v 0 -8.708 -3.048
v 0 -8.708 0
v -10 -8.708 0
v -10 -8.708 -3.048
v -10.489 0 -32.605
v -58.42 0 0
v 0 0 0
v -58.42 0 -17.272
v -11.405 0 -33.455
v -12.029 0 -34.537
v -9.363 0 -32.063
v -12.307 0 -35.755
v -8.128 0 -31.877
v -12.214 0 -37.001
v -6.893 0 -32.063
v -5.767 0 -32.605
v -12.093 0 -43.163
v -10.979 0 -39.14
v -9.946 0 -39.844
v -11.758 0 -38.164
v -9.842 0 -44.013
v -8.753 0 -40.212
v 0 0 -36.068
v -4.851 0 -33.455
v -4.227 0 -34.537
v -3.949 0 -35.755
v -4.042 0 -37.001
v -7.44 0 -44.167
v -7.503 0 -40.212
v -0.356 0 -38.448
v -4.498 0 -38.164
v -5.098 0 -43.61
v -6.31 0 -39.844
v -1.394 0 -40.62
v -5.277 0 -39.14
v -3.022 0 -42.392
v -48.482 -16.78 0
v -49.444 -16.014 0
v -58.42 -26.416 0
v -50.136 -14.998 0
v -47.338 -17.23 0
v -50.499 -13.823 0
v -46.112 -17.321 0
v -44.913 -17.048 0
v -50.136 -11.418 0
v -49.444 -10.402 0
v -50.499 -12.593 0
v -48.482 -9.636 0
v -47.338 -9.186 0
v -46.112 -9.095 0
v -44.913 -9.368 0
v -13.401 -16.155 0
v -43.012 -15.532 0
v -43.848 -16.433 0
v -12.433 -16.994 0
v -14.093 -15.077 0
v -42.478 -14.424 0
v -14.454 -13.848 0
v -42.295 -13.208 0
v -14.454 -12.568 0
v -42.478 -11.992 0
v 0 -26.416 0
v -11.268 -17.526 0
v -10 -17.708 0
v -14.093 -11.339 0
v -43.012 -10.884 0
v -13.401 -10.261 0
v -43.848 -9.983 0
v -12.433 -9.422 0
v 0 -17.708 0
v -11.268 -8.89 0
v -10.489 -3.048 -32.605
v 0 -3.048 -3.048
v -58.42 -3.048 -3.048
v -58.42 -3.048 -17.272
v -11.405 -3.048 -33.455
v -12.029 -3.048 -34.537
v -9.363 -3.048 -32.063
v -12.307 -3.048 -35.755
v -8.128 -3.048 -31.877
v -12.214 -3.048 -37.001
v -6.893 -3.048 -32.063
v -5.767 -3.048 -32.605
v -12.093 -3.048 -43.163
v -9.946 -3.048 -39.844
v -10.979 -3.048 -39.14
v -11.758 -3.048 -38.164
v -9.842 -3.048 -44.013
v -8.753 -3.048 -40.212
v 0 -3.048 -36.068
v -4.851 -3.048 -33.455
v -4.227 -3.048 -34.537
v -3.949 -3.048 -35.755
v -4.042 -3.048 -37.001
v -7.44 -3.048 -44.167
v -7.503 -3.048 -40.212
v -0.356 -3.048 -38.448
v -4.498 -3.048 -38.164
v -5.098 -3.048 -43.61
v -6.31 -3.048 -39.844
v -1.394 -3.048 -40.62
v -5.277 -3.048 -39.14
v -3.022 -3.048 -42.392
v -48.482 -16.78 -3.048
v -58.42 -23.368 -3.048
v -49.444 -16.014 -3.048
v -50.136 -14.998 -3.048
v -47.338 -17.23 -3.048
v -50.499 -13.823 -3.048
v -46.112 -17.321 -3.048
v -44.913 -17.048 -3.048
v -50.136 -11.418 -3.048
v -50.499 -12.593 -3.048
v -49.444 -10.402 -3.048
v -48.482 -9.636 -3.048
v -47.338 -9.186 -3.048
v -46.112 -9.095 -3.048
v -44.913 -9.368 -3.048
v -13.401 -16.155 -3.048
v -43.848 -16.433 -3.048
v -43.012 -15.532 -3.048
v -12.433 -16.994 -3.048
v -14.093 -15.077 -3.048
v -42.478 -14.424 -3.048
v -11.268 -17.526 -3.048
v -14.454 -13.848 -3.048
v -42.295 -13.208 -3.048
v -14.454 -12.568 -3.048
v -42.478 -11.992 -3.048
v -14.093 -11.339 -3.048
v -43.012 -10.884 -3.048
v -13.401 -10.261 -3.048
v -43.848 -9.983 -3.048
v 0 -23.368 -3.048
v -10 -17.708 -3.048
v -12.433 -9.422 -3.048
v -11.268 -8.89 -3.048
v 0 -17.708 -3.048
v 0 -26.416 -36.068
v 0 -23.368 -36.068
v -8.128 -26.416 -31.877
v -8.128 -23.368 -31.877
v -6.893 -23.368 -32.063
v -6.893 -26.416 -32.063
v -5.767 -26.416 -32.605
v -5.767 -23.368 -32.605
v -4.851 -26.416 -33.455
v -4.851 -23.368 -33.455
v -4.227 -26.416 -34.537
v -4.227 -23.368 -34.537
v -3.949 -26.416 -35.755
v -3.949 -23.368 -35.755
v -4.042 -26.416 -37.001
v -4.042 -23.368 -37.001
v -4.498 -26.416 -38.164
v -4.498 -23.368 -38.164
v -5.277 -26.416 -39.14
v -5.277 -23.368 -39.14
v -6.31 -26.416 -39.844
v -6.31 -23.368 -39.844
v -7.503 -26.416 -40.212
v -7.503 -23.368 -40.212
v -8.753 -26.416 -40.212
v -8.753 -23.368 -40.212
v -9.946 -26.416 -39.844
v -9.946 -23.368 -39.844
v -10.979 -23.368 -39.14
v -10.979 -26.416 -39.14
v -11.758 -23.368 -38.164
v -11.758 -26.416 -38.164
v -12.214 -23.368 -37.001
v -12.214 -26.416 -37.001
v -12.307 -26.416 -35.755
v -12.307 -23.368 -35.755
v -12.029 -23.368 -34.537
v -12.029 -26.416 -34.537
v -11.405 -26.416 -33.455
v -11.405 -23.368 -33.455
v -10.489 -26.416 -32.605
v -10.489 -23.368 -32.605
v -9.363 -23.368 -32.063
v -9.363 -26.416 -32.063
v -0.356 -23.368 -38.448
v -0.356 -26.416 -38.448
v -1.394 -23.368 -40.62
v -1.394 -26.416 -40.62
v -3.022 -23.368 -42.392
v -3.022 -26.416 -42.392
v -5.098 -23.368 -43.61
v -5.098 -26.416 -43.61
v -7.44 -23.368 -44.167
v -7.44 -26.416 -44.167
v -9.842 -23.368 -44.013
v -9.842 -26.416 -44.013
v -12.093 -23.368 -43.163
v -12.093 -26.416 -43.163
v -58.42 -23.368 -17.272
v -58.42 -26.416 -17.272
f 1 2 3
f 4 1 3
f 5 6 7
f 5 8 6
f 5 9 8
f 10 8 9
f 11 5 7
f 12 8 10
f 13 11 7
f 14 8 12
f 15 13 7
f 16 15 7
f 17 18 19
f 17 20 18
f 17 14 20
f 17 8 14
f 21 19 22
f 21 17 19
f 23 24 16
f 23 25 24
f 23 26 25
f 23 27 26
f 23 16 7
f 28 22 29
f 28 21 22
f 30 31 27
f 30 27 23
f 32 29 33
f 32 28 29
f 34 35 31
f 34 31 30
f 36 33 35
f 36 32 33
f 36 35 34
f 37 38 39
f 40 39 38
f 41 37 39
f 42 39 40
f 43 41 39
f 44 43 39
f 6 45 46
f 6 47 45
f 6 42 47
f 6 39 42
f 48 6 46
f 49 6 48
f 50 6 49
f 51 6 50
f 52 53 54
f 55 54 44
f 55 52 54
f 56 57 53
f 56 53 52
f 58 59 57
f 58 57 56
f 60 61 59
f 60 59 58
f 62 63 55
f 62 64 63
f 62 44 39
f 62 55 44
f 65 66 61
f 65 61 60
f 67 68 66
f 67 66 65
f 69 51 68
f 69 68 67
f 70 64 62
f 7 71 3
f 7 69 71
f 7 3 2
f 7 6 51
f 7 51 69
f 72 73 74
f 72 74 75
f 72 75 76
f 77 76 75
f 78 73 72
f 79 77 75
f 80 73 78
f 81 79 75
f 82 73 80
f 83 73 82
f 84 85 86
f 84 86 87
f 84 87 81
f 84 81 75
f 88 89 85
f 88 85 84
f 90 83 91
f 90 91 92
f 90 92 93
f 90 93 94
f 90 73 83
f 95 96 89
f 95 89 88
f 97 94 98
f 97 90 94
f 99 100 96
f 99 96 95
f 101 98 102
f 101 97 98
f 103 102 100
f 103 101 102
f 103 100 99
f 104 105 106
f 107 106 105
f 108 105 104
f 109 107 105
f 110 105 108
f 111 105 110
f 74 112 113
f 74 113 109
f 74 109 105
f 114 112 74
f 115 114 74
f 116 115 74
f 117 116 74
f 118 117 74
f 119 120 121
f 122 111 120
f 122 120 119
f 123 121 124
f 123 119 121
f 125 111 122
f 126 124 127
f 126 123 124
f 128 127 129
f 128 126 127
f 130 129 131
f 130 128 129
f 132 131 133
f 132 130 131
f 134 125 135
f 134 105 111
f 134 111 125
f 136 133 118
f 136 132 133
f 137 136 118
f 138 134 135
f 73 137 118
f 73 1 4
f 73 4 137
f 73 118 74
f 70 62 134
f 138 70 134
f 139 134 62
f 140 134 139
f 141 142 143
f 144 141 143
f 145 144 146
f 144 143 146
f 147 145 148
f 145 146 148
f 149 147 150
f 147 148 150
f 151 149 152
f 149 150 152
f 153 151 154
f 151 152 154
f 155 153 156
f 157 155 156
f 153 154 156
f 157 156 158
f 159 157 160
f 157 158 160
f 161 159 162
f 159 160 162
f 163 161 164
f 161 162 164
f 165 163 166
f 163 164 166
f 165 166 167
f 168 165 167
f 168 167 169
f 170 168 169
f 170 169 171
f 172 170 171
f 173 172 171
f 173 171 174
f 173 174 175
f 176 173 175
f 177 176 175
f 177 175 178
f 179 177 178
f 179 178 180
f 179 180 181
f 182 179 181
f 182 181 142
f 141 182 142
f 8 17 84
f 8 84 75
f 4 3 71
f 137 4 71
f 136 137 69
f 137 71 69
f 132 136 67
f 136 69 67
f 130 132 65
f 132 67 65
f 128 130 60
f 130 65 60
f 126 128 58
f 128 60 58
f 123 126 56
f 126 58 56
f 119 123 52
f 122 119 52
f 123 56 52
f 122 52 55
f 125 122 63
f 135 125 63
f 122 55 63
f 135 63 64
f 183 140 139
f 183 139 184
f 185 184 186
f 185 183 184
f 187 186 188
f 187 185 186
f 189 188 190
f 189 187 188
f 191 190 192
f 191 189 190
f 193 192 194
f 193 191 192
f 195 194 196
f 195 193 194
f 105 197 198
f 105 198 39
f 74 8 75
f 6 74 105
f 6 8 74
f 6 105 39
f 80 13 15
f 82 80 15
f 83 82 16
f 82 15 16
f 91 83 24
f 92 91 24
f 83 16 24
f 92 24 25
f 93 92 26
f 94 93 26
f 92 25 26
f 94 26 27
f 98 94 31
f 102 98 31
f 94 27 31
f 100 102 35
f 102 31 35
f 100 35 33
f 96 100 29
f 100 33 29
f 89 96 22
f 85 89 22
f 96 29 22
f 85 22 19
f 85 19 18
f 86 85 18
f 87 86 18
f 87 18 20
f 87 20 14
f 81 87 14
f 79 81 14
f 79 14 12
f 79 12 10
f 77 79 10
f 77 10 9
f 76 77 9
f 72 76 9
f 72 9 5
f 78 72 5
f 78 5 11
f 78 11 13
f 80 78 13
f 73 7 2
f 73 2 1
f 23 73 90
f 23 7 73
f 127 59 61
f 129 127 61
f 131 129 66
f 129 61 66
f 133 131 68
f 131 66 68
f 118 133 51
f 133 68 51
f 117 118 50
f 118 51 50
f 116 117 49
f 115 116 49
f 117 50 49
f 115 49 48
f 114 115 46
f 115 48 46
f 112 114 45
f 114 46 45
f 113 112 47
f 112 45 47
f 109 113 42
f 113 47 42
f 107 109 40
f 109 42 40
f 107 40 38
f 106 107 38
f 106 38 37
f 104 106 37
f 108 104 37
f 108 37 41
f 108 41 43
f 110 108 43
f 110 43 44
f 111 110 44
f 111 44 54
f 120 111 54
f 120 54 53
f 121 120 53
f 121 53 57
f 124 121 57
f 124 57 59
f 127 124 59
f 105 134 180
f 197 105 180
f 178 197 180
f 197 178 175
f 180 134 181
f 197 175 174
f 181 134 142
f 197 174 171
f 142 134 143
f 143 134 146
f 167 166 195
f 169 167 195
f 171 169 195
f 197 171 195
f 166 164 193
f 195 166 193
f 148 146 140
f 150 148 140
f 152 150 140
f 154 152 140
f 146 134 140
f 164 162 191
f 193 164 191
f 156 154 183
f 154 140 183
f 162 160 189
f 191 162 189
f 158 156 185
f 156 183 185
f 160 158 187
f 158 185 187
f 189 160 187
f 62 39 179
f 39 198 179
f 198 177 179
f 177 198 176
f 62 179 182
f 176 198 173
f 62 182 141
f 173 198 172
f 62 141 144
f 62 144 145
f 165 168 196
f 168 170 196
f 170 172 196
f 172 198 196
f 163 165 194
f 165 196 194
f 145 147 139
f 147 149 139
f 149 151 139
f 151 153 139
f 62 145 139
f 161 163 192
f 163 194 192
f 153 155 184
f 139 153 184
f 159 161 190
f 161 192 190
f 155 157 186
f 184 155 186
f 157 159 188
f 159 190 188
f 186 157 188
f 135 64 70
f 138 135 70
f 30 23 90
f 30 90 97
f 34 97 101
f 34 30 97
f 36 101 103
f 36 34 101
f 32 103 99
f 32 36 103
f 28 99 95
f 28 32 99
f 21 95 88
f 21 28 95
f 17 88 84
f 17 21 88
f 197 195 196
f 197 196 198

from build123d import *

# Parameters (mm, degrees)
SKETCH1_R           = 8.128
SKETCH1_R_2         = 4.191
BOSS_EXTRUDE1_DEPTH = 26.416
CUT_EXTRUDE1_REACH  = 60.42
SKETCH2_W           = 41.148
SKETCH2_H           = 20.32
CUT_EXTRUDE2_REACH  = 46.196
SKETCH3_R           = 4.125


with BuildPart() as part:
    # Sketch1 → Boss-Extrude1 (new body)
    with BuildSketch(Plane(origin=(0, 0, 0), x_dir=(1, 0, 0), z_dir=(0, 1, 0))):
        with BuildLine():
            Line((-58.42, 0), (0, 0))
            Line((0, 0), (0, 36.068))
            ThreePointArc((0, 36.068), (-12.241042079, 29.057488688), (-12.09332403, 43.163110242))
            Line((-12.09332403, 43.163110242), (-58.42, 17.272))
            Line((-58.42, 17.272), (-58.42, 0))
        make_face()
        with Locations((-8.128, 36.068)):
            Circle(SKETCH1_R)
        with Locations(Location((-8.128, 36.068, 0), (0, 0, 270))):  # turned: the seam where the file's is
            Circle(SKETCH1_R_2, mode=Mode.SUBTRACT)
    extrude(amount=-BOSS_EXTRUDE1_DEPTH)

    # Sketch2 → Cut-Extrude1 (cut, up to next)
    with BuildSketch(Plane(origin=(0, 0, 0), x_dir=(0, 0, -1), z_dir=(1, 0, 0)), mode=Mode.PRIVATE) as cut_extrude1_sk1:
        with Locations((23.622, -13.208)):
            Rectangle(SKETCH2_W, SKETCH2_H)
    cut_extrude1_tool1 = extrude(cut_extrude1_sk1.sketch, amount=-CUT_EXTRUDE1_REACH, mode=Mode.PRIVATE) & part.part
    add(cut_extrude1_tool1.solids().sort_by_distance((0, -13.208, -23.622))[0], mode=Mode.SUBTRACT)

    # Sketch3 → Cut-Extrude2 (cut, up to next)
    with BuildSketch(Plane.XY, mode=Mode.PRIVATE) as cut_extrude2_sk1:
        with Locations((-46.42, -13.208)):
            Circle(SKETCH3_R)
    cut_extrude2_tool1 = extrude(cut_extrude2_sk1.sketch, amount=-CUT_EXTRUDE2_REACH, mode=Mode.PRIVATE) & part.part
    add(cut_extrude2_tool1.solids().sort_by_distance((-46.42, -13.208, 0))[0], mode=Mode.SUBTRACT)
    # Sketch3 → Cut-Extrude2 (cut, up to next)
    with BuildSketch(Plane.XY, mode=Mode.PRIVATE) as cut_extrude2_sk2:
        with BuildLine():
            Line((0, -13.208), (0, -8.708))
            Line((0, -8.708), (-10, -8.708))
            ThreePointArc((-10, -8.708), (-14.5, -13.208), (-10, -17.708))
            Line((-10, -17.708), (0, -17.708))
            Line((0, -17.708), (0, -13.208))
        make_face()
    cut_extrude2_tool2 = extrude(cut_extrude2_sk2.sketch, amount=-CUT_EXTRUDE2_REACH, mode=Mode.PRIVATE) & part.part
    add(cut_extrude2_tool2.solids().sort_by_distance((-6.804413, -13.208, 0))[0], mode=Mode.SUBTRACT)


solid = part.part
